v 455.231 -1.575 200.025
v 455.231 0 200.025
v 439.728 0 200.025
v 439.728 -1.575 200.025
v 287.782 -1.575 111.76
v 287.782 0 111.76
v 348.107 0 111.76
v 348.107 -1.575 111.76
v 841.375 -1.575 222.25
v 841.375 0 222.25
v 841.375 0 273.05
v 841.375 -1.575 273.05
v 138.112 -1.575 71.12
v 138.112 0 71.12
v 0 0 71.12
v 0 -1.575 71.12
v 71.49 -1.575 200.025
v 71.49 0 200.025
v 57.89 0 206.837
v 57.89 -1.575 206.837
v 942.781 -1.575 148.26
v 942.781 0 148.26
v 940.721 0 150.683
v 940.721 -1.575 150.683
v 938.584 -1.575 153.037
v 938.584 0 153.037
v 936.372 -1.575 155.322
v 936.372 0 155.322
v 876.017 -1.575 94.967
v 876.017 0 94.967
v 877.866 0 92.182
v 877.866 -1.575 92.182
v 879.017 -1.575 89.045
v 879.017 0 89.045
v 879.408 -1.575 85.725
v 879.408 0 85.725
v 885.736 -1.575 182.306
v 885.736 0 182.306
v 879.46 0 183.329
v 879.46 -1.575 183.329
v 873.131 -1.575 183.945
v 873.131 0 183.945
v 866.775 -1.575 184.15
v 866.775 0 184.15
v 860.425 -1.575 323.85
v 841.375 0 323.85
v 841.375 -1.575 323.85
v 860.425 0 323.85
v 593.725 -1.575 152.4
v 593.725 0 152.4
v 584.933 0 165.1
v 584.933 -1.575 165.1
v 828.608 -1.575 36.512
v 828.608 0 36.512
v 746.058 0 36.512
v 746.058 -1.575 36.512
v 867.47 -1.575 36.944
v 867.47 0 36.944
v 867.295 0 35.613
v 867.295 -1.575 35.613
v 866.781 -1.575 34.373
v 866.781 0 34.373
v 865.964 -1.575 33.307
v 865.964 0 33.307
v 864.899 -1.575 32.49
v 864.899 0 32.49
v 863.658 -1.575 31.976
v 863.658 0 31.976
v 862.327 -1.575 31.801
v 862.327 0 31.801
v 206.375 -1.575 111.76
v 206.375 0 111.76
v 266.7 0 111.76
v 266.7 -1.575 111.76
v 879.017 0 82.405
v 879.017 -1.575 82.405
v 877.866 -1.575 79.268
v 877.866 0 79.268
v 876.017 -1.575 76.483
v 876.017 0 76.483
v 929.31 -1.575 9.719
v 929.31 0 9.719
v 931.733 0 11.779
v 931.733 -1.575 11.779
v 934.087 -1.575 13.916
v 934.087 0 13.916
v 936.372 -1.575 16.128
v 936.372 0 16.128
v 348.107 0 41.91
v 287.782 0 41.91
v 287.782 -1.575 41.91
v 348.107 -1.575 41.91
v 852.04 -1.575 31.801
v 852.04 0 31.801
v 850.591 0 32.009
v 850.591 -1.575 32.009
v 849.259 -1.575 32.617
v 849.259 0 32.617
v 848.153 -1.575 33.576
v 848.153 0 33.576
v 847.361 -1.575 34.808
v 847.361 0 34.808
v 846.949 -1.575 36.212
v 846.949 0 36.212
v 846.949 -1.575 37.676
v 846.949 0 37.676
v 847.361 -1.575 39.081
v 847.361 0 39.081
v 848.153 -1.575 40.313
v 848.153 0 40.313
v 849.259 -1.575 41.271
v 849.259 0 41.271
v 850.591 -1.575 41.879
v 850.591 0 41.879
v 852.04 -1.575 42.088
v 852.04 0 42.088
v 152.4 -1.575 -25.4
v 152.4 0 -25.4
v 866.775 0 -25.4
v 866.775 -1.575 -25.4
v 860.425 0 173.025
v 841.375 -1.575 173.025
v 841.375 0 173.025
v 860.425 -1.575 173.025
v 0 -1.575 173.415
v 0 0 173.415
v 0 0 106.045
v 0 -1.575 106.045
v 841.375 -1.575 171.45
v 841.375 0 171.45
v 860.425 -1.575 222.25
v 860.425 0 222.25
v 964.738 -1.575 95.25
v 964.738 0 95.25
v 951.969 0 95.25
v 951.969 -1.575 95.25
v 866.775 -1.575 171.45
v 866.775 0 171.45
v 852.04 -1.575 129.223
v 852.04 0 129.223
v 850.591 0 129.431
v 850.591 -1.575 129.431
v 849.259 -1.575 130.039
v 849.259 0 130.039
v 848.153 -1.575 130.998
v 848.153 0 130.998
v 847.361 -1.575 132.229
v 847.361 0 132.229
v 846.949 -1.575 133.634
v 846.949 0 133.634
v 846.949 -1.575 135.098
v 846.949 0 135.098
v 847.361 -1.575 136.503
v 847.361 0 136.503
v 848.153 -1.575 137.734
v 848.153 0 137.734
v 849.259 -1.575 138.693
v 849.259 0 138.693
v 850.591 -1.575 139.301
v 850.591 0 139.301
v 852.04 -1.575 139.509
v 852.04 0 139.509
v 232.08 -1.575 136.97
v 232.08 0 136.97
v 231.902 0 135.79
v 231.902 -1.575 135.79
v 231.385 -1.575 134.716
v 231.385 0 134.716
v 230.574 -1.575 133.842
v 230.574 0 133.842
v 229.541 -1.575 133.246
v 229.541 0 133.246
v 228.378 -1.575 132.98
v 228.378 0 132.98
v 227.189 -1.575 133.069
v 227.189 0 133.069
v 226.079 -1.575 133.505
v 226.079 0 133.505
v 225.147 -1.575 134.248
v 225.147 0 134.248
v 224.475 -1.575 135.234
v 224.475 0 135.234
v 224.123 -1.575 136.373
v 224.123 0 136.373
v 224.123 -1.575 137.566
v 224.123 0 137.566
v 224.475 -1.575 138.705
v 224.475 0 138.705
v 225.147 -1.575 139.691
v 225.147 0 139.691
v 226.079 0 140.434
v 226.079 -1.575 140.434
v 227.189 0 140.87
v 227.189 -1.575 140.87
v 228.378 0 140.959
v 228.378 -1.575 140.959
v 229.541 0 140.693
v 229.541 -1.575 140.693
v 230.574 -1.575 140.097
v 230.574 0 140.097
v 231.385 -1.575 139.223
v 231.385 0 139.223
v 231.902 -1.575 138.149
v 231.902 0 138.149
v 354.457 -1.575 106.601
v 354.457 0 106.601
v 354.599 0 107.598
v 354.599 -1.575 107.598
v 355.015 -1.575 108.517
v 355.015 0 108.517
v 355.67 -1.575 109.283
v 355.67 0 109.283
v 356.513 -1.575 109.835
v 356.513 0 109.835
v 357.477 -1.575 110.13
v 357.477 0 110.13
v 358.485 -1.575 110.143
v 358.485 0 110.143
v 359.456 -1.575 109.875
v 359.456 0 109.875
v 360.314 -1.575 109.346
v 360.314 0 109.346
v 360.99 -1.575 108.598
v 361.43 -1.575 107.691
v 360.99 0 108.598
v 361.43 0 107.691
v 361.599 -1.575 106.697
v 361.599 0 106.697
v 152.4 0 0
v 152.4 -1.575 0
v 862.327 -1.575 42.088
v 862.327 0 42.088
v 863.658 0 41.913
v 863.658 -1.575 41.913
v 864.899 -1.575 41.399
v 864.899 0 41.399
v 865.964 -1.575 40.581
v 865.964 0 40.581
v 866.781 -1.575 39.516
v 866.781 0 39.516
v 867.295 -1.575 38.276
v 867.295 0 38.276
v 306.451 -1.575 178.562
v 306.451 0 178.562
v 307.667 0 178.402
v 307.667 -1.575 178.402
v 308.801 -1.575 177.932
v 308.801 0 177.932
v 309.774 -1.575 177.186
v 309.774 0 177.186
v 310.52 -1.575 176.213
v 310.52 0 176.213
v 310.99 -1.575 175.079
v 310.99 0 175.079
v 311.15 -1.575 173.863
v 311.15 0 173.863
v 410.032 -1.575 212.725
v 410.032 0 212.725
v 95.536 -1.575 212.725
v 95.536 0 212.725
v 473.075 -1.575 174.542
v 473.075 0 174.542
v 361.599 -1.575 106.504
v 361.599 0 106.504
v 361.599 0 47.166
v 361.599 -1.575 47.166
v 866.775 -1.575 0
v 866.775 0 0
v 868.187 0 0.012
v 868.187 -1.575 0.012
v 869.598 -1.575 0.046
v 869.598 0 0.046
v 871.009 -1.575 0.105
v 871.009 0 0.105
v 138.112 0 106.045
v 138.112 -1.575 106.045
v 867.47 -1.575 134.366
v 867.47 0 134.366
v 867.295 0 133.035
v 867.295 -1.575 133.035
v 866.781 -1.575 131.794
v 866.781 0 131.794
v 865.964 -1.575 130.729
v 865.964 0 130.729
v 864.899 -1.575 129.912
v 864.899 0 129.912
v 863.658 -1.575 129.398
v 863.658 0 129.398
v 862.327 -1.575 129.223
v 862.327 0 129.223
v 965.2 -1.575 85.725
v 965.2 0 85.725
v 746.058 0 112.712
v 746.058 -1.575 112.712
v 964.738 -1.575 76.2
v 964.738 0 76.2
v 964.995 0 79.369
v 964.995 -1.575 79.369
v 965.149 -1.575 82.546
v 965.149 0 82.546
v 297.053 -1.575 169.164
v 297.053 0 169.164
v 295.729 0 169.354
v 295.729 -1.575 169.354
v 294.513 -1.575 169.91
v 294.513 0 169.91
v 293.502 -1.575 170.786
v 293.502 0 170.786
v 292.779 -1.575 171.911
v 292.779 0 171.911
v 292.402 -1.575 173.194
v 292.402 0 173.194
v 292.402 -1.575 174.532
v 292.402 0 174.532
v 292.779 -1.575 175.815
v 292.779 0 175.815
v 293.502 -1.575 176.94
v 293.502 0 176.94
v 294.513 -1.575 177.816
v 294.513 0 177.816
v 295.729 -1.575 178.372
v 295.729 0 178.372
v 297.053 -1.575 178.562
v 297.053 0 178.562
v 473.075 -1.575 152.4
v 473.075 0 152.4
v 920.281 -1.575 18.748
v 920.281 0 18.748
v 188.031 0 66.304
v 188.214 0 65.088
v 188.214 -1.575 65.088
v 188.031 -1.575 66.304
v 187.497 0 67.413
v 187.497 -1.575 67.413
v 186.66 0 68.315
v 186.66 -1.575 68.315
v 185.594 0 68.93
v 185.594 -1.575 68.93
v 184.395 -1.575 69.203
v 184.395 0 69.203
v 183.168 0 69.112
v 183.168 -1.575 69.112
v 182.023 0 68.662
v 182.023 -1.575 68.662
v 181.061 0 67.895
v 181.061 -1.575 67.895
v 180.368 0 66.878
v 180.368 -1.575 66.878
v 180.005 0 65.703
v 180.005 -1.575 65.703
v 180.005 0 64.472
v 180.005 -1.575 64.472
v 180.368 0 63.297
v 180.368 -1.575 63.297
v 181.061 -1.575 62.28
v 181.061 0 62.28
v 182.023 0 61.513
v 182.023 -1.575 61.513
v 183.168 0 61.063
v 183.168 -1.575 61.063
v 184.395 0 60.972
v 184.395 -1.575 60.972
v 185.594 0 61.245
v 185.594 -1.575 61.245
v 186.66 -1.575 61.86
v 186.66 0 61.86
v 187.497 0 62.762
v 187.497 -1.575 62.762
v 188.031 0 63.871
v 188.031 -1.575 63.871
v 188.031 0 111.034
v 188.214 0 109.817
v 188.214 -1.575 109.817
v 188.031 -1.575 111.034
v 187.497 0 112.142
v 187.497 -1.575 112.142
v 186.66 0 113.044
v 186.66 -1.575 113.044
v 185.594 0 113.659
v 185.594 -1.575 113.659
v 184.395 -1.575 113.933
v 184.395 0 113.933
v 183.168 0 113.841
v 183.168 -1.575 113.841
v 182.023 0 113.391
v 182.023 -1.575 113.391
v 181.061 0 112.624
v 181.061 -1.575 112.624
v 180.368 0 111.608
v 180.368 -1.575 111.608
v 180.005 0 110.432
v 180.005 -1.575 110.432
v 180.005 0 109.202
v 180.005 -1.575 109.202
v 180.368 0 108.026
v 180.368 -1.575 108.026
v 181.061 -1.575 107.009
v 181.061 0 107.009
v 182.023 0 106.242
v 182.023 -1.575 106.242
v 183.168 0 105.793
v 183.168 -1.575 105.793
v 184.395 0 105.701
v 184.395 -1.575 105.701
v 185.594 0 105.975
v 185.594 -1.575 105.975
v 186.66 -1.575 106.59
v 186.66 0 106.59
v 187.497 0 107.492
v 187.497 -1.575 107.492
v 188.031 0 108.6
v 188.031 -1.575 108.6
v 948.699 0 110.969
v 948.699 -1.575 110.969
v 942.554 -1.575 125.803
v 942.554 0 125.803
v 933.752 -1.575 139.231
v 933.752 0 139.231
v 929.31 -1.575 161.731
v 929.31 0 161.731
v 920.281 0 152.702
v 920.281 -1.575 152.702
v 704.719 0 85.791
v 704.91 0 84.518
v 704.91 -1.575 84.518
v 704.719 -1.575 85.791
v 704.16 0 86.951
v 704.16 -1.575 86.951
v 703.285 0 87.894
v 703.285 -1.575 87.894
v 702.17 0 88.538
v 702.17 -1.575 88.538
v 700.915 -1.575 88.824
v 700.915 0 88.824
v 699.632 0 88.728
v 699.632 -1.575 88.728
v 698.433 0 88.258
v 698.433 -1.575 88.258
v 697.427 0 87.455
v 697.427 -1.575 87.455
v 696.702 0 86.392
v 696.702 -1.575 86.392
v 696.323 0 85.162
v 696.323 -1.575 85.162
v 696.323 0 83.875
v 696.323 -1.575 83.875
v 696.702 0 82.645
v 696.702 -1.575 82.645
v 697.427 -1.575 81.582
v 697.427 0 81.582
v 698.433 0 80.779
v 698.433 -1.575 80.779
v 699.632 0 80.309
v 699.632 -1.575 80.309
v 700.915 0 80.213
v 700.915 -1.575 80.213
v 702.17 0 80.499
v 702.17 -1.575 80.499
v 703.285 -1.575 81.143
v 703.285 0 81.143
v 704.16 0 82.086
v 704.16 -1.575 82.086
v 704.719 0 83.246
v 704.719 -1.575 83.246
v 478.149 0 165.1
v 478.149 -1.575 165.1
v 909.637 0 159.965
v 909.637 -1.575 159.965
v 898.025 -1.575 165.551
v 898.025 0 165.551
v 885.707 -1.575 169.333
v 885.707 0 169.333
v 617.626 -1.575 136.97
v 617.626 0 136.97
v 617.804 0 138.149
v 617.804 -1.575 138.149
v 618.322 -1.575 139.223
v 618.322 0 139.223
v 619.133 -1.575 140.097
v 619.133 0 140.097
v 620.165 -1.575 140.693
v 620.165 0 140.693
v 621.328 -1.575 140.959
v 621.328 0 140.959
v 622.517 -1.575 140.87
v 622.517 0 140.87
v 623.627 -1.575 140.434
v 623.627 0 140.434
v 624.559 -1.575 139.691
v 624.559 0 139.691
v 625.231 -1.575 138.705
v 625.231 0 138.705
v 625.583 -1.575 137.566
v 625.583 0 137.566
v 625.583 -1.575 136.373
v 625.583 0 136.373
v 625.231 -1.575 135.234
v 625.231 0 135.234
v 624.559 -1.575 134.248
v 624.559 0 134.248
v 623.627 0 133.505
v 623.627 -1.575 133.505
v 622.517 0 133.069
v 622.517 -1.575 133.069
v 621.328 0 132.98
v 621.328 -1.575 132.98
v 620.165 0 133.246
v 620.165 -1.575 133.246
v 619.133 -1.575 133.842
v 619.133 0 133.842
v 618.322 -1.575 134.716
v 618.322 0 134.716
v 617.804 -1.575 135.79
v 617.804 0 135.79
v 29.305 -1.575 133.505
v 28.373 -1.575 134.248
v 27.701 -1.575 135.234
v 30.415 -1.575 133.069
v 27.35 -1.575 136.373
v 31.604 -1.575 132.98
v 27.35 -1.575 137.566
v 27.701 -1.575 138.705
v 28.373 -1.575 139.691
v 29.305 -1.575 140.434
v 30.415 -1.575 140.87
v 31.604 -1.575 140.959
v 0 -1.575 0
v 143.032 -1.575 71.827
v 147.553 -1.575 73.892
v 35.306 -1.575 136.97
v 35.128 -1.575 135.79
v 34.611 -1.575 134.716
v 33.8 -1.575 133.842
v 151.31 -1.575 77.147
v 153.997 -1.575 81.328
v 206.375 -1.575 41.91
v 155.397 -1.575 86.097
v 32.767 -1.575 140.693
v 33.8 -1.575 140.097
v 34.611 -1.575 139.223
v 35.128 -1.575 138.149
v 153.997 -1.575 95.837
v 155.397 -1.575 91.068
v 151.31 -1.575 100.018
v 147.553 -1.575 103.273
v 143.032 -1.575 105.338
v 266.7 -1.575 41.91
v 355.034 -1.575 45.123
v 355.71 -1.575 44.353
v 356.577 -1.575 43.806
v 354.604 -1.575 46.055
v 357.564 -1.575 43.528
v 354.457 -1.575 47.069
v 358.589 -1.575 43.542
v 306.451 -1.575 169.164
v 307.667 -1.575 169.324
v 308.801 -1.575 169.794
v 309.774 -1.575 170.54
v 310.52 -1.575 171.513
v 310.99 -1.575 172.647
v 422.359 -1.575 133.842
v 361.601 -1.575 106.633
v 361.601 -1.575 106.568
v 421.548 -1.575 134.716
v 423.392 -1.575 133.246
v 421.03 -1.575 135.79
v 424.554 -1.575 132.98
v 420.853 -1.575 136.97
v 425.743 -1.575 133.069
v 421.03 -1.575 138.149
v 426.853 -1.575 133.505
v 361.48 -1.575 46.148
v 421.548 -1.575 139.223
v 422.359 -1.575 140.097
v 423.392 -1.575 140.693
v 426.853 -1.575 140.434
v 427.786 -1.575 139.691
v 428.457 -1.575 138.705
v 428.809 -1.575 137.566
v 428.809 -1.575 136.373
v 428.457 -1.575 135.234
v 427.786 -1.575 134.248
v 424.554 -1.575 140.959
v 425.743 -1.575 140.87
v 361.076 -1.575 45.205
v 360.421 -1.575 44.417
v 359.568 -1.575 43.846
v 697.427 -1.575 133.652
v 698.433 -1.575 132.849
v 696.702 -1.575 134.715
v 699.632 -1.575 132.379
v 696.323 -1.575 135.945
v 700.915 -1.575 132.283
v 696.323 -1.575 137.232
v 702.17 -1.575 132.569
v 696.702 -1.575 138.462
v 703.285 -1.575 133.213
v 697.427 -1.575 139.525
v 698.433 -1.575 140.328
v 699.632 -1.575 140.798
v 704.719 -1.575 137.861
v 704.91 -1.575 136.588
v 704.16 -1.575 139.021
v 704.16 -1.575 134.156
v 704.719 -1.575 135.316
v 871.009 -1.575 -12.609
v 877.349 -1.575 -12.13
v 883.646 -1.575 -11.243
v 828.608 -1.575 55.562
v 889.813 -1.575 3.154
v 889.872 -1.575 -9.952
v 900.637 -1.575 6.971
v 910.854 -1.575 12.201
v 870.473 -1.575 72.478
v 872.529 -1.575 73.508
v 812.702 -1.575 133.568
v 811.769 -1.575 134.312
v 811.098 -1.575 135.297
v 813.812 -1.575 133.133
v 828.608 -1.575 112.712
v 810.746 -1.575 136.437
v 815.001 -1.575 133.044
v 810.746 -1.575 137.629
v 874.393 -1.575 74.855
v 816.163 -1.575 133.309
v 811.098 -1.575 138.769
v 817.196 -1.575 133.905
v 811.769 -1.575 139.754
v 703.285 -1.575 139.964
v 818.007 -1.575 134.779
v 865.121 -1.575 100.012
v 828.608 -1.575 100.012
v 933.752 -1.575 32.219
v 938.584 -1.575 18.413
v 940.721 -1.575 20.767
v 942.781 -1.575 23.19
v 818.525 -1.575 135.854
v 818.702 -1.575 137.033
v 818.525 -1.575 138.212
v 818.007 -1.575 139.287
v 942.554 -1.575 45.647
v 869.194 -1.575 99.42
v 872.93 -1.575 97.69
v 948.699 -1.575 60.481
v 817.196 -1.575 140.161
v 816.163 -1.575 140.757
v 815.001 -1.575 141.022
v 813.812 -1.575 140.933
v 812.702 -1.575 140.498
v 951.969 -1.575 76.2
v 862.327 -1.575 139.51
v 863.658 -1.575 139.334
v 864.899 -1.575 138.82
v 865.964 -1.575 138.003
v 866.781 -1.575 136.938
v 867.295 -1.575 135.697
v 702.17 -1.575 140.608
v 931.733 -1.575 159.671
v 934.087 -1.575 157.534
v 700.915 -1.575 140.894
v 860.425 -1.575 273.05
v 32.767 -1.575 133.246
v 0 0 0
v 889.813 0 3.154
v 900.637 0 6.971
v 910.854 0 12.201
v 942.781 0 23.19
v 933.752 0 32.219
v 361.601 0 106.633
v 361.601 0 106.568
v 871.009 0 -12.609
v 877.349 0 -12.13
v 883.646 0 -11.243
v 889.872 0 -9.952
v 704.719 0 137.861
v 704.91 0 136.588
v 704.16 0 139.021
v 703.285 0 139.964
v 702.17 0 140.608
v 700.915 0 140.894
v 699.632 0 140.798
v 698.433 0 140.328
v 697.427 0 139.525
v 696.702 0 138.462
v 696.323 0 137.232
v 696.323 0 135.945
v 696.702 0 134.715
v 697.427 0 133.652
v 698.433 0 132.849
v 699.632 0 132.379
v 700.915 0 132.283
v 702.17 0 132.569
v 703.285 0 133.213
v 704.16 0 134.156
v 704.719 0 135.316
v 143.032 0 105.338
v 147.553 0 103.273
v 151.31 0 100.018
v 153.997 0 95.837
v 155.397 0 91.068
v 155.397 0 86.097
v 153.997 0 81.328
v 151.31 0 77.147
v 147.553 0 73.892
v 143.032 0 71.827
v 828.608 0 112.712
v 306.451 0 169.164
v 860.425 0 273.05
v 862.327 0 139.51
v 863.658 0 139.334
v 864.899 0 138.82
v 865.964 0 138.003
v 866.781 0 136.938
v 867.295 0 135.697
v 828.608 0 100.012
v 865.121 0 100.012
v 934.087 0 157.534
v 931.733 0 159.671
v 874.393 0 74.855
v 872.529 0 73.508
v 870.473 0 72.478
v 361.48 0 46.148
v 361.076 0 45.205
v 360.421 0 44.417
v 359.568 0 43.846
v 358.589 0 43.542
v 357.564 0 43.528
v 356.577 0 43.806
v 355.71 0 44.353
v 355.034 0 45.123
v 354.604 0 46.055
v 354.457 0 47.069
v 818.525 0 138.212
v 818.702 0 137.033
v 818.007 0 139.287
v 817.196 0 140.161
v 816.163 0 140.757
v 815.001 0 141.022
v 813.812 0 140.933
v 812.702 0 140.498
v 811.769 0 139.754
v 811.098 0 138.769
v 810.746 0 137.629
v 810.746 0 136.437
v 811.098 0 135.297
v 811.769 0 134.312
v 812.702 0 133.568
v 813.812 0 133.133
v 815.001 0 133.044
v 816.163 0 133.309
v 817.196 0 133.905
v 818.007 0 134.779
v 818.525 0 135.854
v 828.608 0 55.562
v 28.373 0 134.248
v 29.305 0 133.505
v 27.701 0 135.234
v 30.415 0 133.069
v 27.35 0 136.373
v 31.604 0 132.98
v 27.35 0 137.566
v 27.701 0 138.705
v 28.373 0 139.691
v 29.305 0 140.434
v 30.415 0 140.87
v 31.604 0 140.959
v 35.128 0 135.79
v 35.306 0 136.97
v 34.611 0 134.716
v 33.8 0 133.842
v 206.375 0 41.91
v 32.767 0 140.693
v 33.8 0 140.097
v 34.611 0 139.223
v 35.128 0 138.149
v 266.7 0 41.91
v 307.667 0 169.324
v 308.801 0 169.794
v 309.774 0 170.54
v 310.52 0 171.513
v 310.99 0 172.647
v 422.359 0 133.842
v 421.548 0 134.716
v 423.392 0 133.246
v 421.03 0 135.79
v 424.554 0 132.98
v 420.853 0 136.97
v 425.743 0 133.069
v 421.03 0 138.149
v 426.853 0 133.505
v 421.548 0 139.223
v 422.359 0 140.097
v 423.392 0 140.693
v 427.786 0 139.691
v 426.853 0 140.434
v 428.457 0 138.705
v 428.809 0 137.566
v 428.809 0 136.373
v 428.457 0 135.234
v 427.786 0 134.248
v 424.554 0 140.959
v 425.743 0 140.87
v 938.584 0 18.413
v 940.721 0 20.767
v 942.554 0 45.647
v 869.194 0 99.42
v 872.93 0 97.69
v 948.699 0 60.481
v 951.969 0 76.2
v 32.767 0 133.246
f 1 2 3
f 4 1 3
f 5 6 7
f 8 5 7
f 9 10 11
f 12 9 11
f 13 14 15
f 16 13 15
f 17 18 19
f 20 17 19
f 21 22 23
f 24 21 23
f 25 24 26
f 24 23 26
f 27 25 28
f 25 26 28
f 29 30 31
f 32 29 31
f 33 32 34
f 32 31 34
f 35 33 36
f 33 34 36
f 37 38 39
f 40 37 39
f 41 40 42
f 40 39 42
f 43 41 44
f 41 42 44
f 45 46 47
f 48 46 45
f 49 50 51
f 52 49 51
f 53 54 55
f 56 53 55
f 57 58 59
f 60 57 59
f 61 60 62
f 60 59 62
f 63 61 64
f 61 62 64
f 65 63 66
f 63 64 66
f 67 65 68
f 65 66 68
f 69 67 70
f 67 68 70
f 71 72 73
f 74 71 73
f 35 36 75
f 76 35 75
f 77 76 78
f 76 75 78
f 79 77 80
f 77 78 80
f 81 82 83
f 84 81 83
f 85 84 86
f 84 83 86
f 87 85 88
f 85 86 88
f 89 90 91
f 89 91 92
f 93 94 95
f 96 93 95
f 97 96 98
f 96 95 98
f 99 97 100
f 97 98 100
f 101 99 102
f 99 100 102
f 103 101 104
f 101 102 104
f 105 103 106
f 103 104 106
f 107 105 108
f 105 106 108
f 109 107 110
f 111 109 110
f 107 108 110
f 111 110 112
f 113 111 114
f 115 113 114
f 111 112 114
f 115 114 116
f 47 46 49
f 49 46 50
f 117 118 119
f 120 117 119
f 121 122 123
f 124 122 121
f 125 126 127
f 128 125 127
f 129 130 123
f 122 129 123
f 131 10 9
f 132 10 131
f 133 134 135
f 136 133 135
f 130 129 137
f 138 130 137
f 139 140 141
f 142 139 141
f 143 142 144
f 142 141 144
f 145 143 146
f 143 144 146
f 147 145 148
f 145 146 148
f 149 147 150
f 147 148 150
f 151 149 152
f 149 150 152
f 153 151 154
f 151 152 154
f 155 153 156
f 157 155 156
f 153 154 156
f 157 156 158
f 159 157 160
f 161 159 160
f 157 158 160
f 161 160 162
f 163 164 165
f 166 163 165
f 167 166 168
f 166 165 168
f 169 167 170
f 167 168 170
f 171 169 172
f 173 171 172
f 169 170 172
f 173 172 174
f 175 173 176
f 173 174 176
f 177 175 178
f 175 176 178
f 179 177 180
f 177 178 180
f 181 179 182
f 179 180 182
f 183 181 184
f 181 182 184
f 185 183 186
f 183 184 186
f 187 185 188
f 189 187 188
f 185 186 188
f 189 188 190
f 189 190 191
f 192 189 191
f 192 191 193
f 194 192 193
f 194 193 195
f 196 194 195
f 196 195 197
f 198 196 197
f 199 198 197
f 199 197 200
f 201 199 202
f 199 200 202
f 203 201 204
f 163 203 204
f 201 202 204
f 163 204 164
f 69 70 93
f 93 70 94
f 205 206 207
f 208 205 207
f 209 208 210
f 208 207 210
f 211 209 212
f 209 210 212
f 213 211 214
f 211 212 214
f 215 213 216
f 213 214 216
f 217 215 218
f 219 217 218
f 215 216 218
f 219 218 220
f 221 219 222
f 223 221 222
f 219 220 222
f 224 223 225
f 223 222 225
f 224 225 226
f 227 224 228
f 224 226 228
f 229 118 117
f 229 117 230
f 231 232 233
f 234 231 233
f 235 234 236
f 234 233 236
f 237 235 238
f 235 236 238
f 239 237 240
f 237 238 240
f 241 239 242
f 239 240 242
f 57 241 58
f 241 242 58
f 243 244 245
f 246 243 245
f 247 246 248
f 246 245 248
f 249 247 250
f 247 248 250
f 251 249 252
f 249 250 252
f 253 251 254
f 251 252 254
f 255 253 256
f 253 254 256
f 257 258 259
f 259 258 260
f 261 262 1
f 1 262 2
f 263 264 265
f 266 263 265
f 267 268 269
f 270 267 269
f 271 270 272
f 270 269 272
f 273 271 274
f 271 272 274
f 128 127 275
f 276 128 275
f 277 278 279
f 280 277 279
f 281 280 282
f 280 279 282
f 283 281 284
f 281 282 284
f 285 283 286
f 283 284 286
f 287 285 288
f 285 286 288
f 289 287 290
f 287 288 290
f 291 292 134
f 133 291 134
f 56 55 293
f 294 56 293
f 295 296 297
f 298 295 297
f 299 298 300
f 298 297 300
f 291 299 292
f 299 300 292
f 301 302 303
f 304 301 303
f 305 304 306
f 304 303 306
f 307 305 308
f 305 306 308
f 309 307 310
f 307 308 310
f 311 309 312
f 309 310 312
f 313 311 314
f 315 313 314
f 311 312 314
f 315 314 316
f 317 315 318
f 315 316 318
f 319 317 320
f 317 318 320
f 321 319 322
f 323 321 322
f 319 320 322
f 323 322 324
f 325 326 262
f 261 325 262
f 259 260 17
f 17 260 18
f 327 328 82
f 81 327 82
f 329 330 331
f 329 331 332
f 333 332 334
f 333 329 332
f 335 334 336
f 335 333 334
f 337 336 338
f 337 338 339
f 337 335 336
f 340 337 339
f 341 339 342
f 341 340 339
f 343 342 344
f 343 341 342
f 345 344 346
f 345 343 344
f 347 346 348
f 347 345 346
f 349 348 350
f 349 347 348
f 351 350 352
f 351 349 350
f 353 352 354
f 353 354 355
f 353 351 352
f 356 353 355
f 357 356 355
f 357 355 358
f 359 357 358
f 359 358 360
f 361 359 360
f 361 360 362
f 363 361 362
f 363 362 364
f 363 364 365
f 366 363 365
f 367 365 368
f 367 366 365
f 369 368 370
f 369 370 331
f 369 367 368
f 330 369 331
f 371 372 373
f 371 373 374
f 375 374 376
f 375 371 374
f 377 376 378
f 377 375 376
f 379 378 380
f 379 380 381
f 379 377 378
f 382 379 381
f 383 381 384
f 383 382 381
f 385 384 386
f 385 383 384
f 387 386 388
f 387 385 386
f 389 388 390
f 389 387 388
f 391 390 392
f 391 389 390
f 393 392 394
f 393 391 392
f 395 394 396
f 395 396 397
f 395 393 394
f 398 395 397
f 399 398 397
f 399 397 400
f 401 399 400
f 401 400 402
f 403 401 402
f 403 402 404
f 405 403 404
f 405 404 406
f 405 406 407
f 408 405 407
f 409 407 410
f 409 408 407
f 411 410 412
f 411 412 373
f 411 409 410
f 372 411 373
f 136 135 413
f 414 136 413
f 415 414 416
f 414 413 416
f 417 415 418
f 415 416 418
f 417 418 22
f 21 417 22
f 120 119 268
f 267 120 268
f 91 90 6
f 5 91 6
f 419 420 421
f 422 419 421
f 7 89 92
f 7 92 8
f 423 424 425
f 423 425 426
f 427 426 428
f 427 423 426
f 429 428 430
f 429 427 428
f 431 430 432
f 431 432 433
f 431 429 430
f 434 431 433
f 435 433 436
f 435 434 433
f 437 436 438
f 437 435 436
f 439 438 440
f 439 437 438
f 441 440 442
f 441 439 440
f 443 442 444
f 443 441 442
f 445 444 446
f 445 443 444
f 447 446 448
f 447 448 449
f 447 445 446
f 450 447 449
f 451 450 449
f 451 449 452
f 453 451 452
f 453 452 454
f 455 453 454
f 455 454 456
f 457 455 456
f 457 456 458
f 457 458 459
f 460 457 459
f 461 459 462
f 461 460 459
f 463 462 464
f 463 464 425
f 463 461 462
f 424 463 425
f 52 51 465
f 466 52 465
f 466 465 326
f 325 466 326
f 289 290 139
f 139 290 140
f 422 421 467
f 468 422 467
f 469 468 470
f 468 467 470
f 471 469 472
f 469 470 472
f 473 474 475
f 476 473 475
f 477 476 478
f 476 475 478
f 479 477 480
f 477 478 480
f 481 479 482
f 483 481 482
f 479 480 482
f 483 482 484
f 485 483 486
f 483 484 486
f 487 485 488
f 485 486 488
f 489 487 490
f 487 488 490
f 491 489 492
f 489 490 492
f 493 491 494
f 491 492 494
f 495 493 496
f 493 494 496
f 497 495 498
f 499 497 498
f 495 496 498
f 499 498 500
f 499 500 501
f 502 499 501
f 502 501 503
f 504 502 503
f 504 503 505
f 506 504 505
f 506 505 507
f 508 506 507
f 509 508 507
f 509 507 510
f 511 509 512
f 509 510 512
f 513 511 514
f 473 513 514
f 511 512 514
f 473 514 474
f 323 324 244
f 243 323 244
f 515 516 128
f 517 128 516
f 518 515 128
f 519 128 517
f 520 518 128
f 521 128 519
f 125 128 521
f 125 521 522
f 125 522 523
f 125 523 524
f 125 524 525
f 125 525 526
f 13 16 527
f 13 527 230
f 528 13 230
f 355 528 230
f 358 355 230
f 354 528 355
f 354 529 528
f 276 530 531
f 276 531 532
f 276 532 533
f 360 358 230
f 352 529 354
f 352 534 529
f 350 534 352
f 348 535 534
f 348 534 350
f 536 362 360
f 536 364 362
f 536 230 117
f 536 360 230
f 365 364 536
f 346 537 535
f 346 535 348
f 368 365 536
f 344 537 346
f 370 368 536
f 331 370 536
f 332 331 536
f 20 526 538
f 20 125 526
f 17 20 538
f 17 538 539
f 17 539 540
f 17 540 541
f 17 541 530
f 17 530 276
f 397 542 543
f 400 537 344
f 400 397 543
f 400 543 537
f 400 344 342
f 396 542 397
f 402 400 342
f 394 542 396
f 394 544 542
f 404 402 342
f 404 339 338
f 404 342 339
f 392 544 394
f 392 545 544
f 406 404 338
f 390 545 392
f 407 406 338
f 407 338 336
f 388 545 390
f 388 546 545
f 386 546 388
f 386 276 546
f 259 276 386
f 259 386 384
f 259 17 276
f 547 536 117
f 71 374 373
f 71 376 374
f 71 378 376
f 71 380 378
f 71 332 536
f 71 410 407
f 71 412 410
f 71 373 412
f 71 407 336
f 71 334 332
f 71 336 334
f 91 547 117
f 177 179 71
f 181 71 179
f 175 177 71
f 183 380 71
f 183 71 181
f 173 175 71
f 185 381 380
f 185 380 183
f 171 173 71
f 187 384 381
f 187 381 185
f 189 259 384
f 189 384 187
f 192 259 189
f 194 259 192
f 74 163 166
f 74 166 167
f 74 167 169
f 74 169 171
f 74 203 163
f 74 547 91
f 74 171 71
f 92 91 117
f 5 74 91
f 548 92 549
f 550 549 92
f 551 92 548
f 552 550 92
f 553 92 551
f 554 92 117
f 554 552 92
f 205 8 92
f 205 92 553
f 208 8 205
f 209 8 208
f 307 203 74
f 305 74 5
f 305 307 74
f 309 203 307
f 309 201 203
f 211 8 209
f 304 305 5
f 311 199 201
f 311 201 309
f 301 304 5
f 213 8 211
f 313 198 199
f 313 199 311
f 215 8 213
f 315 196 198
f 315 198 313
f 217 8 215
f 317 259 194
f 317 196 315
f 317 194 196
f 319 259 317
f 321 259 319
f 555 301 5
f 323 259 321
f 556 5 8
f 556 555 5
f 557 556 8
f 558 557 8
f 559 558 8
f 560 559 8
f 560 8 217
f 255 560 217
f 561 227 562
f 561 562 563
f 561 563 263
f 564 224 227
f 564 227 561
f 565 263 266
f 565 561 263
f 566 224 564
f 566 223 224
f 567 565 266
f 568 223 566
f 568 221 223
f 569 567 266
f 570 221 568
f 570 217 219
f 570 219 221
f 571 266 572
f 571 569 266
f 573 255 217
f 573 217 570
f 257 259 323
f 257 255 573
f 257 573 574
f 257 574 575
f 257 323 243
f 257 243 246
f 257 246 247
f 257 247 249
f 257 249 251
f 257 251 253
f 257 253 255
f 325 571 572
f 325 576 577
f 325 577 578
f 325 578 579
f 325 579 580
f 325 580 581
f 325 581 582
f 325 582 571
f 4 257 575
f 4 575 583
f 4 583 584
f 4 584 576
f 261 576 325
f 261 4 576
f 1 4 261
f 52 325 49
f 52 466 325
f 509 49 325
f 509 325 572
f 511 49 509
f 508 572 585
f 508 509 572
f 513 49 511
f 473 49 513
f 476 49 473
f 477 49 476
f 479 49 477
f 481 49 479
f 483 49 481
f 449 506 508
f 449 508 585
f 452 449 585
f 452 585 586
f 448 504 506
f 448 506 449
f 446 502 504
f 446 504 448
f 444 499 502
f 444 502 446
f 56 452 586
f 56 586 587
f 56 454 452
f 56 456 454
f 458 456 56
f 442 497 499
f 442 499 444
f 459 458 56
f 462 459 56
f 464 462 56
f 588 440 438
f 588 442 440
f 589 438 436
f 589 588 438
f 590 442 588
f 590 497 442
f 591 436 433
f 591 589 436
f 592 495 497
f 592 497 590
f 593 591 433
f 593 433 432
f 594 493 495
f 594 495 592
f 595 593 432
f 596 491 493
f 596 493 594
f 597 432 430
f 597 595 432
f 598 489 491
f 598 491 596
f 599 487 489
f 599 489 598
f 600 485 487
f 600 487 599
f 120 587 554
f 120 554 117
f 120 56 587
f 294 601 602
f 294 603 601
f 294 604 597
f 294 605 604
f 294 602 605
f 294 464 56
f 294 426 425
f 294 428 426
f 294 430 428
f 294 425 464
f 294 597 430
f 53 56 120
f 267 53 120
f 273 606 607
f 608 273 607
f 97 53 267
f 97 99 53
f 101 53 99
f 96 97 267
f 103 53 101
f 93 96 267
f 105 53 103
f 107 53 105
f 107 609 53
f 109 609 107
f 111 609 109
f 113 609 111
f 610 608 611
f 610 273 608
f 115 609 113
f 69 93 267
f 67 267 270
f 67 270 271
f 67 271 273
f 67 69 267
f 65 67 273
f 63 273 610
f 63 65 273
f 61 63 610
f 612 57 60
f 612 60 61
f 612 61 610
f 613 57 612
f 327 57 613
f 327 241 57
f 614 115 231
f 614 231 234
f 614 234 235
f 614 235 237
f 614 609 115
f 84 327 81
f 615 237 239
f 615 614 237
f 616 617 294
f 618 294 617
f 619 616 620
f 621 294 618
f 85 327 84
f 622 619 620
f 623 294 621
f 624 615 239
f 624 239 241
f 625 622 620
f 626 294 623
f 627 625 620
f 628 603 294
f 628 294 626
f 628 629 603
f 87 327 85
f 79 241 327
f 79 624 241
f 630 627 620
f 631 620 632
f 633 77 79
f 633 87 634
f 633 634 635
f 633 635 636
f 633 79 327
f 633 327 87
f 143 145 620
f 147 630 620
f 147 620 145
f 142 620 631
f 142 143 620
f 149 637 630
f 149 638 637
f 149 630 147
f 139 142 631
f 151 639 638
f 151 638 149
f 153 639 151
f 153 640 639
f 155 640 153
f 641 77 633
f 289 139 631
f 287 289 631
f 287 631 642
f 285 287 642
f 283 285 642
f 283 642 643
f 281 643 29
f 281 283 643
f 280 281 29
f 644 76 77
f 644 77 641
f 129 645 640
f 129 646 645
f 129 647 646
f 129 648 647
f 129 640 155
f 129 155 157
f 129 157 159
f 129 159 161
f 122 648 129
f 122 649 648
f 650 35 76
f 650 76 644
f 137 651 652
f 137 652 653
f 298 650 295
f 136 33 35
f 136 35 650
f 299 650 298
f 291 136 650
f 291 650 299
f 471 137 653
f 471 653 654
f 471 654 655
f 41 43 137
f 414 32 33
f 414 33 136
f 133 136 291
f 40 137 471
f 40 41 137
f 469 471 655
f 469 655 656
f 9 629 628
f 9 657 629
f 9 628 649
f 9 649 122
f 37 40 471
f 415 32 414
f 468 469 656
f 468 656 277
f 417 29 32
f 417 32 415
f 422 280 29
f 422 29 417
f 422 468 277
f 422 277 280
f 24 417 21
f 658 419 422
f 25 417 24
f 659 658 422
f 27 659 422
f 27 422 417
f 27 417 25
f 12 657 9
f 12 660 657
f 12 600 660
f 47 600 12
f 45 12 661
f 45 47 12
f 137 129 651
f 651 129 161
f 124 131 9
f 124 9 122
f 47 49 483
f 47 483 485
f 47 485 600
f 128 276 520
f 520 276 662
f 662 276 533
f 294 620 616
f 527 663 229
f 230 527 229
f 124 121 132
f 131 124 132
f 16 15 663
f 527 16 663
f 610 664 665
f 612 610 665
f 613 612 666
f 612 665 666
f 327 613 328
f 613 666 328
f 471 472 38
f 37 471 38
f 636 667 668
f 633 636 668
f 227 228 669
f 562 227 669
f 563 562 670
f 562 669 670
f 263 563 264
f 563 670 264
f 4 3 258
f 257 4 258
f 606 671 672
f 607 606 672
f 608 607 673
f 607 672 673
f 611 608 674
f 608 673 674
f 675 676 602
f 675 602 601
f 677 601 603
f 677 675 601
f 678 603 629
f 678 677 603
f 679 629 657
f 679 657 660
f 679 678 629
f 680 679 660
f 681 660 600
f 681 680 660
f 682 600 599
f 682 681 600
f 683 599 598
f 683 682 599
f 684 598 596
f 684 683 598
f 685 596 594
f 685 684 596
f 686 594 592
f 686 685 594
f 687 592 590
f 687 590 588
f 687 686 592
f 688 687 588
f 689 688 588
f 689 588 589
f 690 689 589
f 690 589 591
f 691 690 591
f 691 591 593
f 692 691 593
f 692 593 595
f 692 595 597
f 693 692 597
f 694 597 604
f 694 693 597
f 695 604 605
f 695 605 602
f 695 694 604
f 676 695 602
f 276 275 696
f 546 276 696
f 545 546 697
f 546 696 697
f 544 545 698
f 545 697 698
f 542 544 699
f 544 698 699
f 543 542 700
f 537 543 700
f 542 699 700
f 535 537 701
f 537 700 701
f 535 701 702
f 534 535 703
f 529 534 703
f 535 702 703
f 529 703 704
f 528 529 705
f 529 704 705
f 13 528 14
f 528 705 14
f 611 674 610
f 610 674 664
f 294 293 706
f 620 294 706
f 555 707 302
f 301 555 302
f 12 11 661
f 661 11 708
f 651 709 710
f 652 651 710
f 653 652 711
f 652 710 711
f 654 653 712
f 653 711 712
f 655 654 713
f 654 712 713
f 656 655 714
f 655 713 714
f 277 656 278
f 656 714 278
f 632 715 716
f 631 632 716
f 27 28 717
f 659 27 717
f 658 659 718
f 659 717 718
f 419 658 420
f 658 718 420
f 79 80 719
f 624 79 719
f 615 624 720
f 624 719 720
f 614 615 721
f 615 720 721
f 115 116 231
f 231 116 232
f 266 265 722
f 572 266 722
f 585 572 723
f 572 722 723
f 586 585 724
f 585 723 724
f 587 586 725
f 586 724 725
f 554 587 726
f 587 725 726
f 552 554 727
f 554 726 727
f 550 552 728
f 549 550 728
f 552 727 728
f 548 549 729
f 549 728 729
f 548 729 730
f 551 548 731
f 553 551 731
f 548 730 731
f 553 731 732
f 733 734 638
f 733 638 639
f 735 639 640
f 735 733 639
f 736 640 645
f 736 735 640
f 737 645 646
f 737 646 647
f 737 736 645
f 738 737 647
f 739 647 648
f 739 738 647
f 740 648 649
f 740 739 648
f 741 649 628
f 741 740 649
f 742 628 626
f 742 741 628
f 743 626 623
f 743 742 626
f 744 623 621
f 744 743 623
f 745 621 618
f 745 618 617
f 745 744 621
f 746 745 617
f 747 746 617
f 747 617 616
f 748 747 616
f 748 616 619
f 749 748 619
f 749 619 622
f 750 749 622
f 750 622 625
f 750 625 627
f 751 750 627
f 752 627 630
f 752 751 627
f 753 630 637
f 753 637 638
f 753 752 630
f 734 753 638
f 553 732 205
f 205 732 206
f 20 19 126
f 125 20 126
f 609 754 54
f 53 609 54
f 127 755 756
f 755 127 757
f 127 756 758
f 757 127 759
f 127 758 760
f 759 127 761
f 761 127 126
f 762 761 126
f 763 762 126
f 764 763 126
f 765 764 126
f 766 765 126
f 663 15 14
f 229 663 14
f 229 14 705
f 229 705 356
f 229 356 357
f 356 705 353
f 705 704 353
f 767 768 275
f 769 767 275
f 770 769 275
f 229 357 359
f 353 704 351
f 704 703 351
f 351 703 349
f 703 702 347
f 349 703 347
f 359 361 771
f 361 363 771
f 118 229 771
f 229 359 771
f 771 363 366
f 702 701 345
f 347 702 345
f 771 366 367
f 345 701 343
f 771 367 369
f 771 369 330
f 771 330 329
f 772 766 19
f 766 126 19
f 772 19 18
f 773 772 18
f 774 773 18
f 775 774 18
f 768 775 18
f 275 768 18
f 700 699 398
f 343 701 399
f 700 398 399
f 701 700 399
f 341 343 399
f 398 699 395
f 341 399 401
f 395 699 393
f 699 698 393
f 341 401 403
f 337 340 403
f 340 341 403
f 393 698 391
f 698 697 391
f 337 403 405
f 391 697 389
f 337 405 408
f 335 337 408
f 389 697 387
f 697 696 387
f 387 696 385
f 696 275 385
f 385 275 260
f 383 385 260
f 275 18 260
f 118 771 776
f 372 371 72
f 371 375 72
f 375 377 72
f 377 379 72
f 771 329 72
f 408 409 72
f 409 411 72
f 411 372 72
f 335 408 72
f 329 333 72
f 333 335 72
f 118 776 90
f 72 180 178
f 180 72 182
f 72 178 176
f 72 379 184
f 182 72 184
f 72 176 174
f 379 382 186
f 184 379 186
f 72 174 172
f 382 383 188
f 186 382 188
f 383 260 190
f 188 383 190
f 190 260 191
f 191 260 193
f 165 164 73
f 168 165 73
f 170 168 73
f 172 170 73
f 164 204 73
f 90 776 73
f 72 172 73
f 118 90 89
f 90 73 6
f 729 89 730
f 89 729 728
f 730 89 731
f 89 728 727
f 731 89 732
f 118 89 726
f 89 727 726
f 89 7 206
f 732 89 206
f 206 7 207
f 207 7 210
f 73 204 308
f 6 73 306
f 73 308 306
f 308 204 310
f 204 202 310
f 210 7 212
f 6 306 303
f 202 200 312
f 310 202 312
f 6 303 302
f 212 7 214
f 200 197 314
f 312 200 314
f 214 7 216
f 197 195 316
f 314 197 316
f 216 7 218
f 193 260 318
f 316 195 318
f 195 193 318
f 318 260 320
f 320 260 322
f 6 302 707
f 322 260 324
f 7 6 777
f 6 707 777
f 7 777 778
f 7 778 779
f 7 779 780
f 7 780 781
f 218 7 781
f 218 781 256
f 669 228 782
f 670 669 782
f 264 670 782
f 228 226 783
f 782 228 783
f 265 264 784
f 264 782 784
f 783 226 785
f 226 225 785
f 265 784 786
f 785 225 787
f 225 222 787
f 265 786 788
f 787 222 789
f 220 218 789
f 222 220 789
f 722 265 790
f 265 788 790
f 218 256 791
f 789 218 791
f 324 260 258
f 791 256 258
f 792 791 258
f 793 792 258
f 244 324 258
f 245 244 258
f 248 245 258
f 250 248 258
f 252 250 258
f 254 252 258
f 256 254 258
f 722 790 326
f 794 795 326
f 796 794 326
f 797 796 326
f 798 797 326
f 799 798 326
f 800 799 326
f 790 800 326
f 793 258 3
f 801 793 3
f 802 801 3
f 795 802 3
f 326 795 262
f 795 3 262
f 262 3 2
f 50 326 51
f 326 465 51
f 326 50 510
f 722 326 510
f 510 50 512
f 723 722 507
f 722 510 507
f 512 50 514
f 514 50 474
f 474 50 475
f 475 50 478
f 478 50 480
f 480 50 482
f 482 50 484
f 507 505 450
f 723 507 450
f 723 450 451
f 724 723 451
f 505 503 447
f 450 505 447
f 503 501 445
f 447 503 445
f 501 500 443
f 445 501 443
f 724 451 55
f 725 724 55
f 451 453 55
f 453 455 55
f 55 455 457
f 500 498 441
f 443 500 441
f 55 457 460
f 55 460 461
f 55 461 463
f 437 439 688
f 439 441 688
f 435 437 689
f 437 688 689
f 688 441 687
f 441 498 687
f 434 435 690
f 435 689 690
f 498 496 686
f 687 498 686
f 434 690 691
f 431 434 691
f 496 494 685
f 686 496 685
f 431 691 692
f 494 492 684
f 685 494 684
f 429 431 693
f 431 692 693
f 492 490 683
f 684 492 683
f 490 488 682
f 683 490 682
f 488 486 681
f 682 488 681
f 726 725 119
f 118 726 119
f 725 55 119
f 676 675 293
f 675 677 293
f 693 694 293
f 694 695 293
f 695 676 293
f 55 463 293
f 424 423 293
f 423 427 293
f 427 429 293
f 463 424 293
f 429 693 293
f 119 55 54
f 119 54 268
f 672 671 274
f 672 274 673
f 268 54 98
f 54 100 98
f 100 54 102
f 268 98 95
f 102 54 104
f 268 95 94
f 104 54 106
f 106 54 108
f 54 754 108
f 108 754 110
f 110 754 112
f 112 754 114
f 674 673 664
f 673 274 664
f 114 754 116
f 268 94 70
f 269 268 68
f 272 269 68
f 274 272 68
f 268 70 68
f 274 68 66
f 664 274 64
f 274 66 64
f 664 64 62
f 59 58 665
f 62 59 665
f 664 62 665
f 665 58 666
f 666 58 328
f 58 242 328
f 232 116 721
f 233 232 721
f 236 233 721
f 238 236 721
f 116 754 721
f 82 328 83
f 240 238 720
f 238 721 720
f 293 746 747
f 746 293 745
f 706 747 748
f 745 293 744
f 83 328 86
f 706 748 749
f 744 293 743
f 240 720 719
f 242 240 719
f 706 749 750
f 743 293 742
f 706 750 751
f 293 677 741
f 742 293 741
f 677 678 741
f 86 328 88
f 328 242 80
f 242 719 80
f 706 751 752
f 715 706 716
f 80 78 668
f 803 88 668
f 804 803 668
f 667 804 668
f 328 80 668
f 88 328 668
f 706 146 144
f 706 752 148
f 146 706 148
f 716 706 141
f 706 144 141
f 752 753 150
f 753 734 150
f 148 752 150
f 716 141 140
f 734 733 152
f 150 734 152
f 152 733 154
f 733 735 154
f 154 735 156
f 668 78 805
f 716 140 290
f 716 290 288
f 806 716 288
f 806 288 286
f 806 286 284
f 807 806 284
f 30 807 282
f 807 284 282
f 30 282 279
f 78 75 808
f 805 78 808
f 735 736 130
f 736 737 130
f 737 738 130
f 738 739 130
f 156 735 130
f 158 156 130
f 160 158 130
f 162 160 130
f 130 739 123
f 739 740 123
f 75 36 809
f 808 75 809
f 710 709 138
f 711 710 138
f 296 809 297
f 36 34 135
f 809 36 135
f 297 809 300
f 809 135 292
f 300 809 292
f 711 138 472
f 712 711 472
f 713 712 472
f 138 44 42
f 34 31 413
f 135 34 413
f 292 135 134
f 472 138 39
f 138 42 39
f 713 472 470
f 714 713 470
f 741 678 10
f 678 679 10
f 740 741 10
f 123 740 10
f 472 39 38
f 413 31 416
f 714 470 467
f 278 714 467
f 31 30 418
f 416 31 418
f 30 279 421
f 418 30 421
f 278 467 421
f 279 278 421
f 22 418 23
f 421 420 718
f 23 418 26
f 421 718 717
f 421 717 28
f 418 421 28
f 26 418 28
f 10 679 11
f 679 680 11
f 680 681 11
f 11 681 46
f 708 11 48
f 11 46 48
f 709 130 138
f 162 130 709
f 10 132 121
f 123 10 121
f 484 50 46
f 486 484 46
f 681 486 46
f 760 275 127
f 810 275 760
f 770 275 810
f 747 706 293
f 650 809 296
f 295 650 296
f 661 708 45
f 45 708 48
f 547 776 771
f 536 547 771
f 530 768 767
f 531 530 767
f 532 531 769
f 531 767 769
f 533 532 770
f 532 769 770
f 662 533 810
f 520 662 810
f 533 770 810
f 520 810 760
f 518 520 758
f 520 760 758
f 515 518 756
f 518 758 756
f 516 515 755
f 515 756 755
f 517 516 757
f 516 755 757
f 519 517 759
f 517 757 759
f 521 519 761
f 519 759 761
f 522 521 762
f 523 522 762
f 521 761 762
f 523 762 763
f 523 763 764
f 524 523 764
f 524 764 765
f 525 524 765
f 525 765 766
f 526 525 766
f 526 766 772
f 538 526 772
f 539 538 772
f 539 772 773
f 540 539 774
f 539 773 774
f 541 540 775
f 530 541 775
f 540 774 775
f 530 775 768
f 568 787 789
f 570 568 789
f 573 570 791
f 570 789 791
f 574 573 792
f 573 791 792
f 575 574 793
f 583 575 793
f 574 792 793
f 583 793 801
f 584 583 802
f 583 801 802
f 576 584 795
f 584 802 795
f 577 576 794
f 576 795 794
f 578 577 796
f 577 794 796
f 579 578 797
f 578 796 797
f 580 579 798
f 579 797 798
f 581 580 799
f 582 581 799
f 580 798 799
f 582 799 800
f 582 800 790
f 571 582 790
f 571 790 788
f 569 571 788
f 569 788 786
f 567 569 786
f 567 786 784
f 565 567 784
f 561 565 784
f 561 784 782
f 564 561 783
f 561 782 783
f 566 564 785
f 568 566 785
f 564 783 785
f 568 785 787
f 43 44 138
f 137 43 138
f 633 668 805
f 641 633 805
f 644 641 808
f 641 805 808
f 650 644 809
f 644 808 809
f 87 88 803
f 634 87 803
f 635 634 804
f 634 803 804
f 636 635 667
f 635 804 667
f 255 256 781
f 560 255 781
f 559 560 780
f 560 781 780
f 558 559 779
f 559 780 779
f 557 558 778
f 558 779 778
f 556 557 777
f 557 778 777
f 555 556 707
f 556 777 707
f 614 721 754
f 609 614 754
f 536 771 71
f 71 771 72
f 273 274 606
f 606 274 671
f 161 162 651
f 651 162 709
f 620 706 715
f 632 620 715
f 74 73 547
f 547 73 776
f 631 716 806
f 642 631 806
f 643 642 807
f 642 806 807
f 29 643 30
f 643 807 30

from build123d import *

# Parameters (mm, degrees)
F0_R     = 4.1275
F0_W     = 60.325
F0_H     = 69.85
F0_R_2   = 4.318
F0_R_3   = 4.0005
F0_W_2   = 19.05
F0_H_2   = 50.8
F0_W_3   = 714.375
F0_H_3   = 25.4
F1_DEPTH = 1.5748
F2_W     = 19.05
F2_H     = 1.5748
F3_DEPTH = 25.4


with BuildPart() as f1:
    # F0 (on Front) → F1 (new body)
    with BuildSketch(Plane.XZ):
        with BuildLine():
            Line((0, 71.12), (0, 0))
            Line((0, 0), (152.4, 0))
            Line((152.4, 0), (866.775, 0))
            ThreePointArc((866.775, 0), (868.892405, 0.026154), (871.008518, 0.1046))
            ThreePointArc((871.008518, 0.1046), (880.495682, 1.105153), (889.812929, 3.15364))
            ThreePointArc((889.812929, 3.15364), (905.833291, 9.414938), (920.281197, 18.748418))
            ThreePointArc((920.281197, 18.748418), (923.925, 21.829358), (927.391729, 25.108271))
            Line((927.391729, 25.108271), (876.016834, 76.483166))
            ThreePointArc((876.016834, 76.483166), (873.488274, 74.143986), (870.473354, 72.477963))
            Line((870.473354, 72.477963), (828.60841, 55.5625))
            Line((828.60841, 55.5625), (828.60841, 36.5125))
            Line((828.60841, 36.5125), (746.05841, 36.5125))
            Line((746.05841, 36.5125), (746.05841, 112.7125))
            Line((746.05841, 112.7125), (828.60841, 112.7125))
            Line((828.60841, 112.7125), (828.60841, 100.0125))
            Line((828.60841, 100.0125), (865.12091, 100.0125))
            ThreePointArc((865.12091, 100.0125), (871.124657, 98.689863), (876.016834, 94.966834))
            Line((876.016834, 94.966834), (927.391729, 146.341729))
            ThreePointArc((927.391729, 146.341729), (923.925, 149.620642), (920.281197, 152.701582))
            ThreePointArc((920.281197, 152.701582), (903.936518, 162.976519), (885.707042, 169.333333))
            ThreePointArc((885.707042, 169.333333), (876.3, 170.91919), (866.775, 171.45))
            Line((866.775, 171.45), (860.425, 171.45))
            Line((860.425, 171.45), (841.375, 171.45))
            Line((841.375, 171.45), (841.375, 222.25))
            Line((841.375, 222.25), (841.375, 273.05))
            Line((841.375, 273.05), (841.375, 323.85))
            Line((841.375, 323.85), (593.725, 152.4))
            Line((593.725, 152.4), (473.075, 152.4))
            Line((473.075, 152.4), (439.727616, 200.025))
            Line((439.727616, 200.025), (71.490397, 200.025))
            Line((71.490397, 200.025), (0, 158.75))
            Line((0, 158.75), (0, 106.045))
            Line((0, 106.045), (138.1125, 106.045))
            ThreePointArc((138.1125, 106.045), (155.575, 88.5825), (138.1125, 71.12))
            Line((138.1125, 71.12), (0, 71.12))
        make_face()
        with Locations((184.0865, 65.0875)):
            Circle(F0_R, mode=Mode.SUBTRACT)
        Polygon((206.375, 41.91), (206.375, 88.5825), (206.375, 111.76), (266.7, 111.76), (266.7, 41.91), align=None, mode=Mode.SUBTRACT)
        with BuildLine():
            ThreePointArc((27.305, 136.9695), (31.3055, 140.97), (35.306, 136.9695))
            ThreePointArc((35.306, 136.9695), (31.3055, 132.969), (27.305, 136.9695))
        make_face(mode=Mode.SUBTRACT)
        with Locations((184.0865, 109.8169)):
            Circle(F0_R, mode=Mode.SUBTRACT)
        with BuildLine():
            ThreePointArc((224.0788, 136.9695), (228.0793, 140.97), (232.0798, 136.9695))
            ThreePointArc((232.0798, 136.9695), (228.0793, 132.969), (224.0788, 136.9695))
        make_face(mode=Mode.SUBTRACT)
        with Locations((317.9445, 76.835)):
            Rectangle(F0_W, F0_H, mode=Mode.SUBTRACT)
        with BuildLine():
            ThreePointArc((361.599438, 47.166166), (358.077275, 43.497828), (354.457, 47.069375))
            Line((354.457, 47.069375), (354.457, 106.600625))
            ThreePointArc((354.457, 106.600625), (357.980475, 110.172172), (361.599438, 106.697416))
            ThreePointArc((361.599438, 106.697416), (361.60075, 106.600625), (361.599438, 106.503834))
            Line((361.599438, 106.503834), (361.599438, 47.166166))
        make_face(mode=Mode.SUBTRACT)
        with BuildLine():
            ThreePointArc((428.8536, 136.9695), (424.8531, 132.969), (420.8526, 136.9695))
            ThreePointArc((420.8526, 136.9695), (424.8531, 140.97), (428.8536, 136.9695))
        make_face(mode=Mode.SUBTRACT)
        with BuildLine():
            ThreePointArc((852.03991, 31.8008), (846.89641, 36.9443), (852.03991, 42.0878))
            Line((852.03991, 42.0878), (862.32691, 42.0878))
            ThreePointArc((862.32691, 42.0878), (865.963914, 40.581304), (867.47041, 36.9443))
            ThreePointArc((867.47041, 36.9443), (865.963914, 33.307296), (862.32691, 31.8008))
            Line((862.32691, 31.8008), (852.03991, 31.8008))
        make_face(mode=Mode.SUBTRACT)
        with Locations((700.59241, 84.5185)):
            Circle(F0_R_2, mode=Mode.SUBTRACT)
        with BuildLine():
            ThreePointArc((625.6274, 136.9695), (621.6269, 132.969), (617.6264, 136.9695))
            ThreePointArc((617.6264, 136.9695), (621.6269, 140.97), (625.6274, 136.9695))
        make_face(mode=Mode.SUBTRACT)
        with Locations((700.59241, 136.5885)):
            Circle(F0_R_2, mode=Mode.SUBTRACT)
        with Locations((814.70191, 137.033)):
            Circle(F0_R_3, mode=Mode.SUBTRACT)
        with BuildLine():
            ThreePointArc((852.03991, 129.2225), (846.89641, 134.366), (852.03991, 139.5095))
            Line((852.03991, 139.5095), (862.32691, 139.5095))
            ThreePointArc((862.32691, 139.5095), (865.963914, 138.003004), (867.47041, 134.366))
            ThreePointArc((867.47041, 134.366), (865.963914, 130.728996), (862.32691, 129.2225))
            Line((862.32691, 129.2225), (852.03991, 129.2225))
        make_face(mode=Mode.SUBTRACT)
        with BuildLine():
            ThreePointArc((306.451, 178.562), (309.773695, 177.185695), (311.15, 173.863))
            ThreePointArc((311.15, 173.863), (309.773695, 170.540305), (306.451, 169.164))
            Line((306.451, 169.164), (297.053, 169.164))
            ThreePointArc((297.053, 169.164), (292.354, 173.863), (297.053, 178.562))
            Line((297.053, 178.562), (306.451, 178.562))
        make_face(mode=Mode.SUBTRACT)
        with BuildLine():
            ThreePointArc((876.016834, 94.966834), (878.533743, 90.647253), (879.40841, 85.725))
            Line((879.40841, 85.725), (952.5, 85.725))
            ThreePointArc((952.5, 85.725), (952.367195, 90.49489), (951.96919, 95.25))
            ThreePointArc((951.96919, 95.25), (945.974573, 118.530537), (933.751582, 139.231197))
            ThreePointArc((933.751582, 139.231197), (930.670642, 142.875), (927.391729, 146.341729))
            Line((927.391729, 146.341729), (876.016834, 94.966834))
        make_face()
        with BuildLine():
            Line((876.016834, 76.483166), (927.391729, 25.108271))
            ThreePointArc((927.391729, 25.108271), (930.670642, 28.575), (933.751582, 32.218803))
            ThreePointArc((933.751582, 32.218803), (945.974573, 52.919463), (951.96919, 76.2))
            ThreePointArc((951.96919, 76.2), (952.367195, 80.95511), (952.5, 85.725))
            Line((952.5, 85.725), (879.40841, 85.725))
            ThreePointArc((879.40841, 85.725), (878.533743, 80.802747), (876.016834, 76.483166))
        make_face()
        with BuildLine():
            ThreePointArc((866.775, 171.45), (876.3, 170.91919), (885.707042, 169.333333))
            Line((885.707042, 169.333333), (885.735586, 182.306452))
            ThreePointArc((885.735586, 182.306452), (876.3, 183.688029), (866.775, 184.15))
            Line((866.775, 184.15), (866.775, 171.45))
        make_face()
        with Locations((850.9, 196.85)):
            Rectangle(F0_W_2, F0_H_2)
        with Locations((850.9, 298.45)):
            Rectangle(F0_W_2, F0_H_2)
        with BuildLine():
            ThreePointArc((920.281197, 152.701582), (923.925, 149.620642), (927.391729, 146.341729))
            Line((927.391729, 146.341729), (936.371985, 155.321985))
            ThreePointArc((936.371985, 155.321985), (932.918717, 158.611826), (929.31013, 161.730514))
            Line((929.31013, 161.730514), (920.281197, 152.701582))
        make_face()
        with BuildLine():
            Line((936.371985, 155.321985), (927.391729, 146.341729))
            ThreePointArc((927.391729, 146.341729), (930.670642, 142.875), (933.751582, 139.231197))
            Line((933.751582, 139.231197), (942.780514, 148.26013))
            ThreePointArc((942.780514, 148.26013), (939.661826, 151.868717), (936.371985, 155.321985))
        make_face()
        with BuildLine():
            ThreePointArc((951.96919, 95.25), (952.367195, 90.49489), (952.5, 85.725))
            Line((952.5, 85.725), (965.2, 85.725))
            Line((965.2, 85.725), (964.738029, 95.25))
            Line((964.738029, 95.25), (951.96919, 95.25))
        make_face()
        with BuildLine():
            ThreePointArc((952.5, 85.725), (952.367195, 80.95511), (951.96919, 76.2))
            Line((951.96919, 76.2), (964.738029, 76.2))
            ThreePointArc((964.738029, 76.2), (965.084439, 80.956902), (965.2, 85.725))
            Line((965.2, 85.725), (952.5, 85.725))
        make_face()
        with BuildLine():
            ThreePointArc((933.751582, 32.218803), (930.670642, 28.575), (927.391729, 25.108271))
            Line((927.391729, 25.108271), (936.371985, 16.128015))
            ThreePointArc((936.371985, 16.128015), (939.661826, 19.581283), (942.780514, 23.18987))
            Line((942.780514, 23.18987), (933.751582, 32.218803))
        make_face()
        with BuildLine():
            ThreePointArc((927.391729, 25.108271), (923.925, 21.829358), (920.281197, 18.748418))
            Line((920.281197, 18.748418), (929.31013, 9.719486))
            ThreePointArc((929.31013, 9.719486), (932.918717, 12.838174), (936.371985, 16.128015))
            Line((936.371985, 16.128015), (927.391729, 25.108271))
        make_face()
        with BuildLine():
            ThreePointArc((889.812929, 3.15364), (880.495682, 1.105153), (871.008518, 0.1046))
            Line((871.008518, 0.1046), (871.008518, -12.60891))
            ThreePointArc((871.008518, -12.60891), (880.504832, -11.737671), (889.872261, -9.951524))
            Line((889.872261, -9.951524), (889.812929, 3.15364))
        make_face()
        with Locations((509.5875, -12.7)):
            Rectangle(F0_W_3, F0_H_3)
        Polygon((478.149444, 165.1), (473.075, 152.4), (593.725, 152.4), (584.932692, 165.1), align=None)
        Polygon((455.231453, 200.025), (439.727616, 200.025), (473.075, 152.4), (473.075, 174.541774), align=None)
        Polygon((95.536456, 212.725), (71.490397, 200.025), (439.727616, 200.025), (410.032392, 212.725), align=None)
        Polygon((0, 173.414697), (0, 158.75), (71.490397, 200.025), (57.889698, 206.837329), align=None)
    extrude(amount=F1_DEPTH)

    # F2 (on face) → F3 (cut)
    with BuildSketch(Plane.XZ.offset(1.5748)):
        with Locations((850.9, 172.2374)):
            Rectangle(F2_W, F2_H)
    extrude(amount=-F3_DEPTH, mode=Mode.SUBTRACT)


solid = f1.part
